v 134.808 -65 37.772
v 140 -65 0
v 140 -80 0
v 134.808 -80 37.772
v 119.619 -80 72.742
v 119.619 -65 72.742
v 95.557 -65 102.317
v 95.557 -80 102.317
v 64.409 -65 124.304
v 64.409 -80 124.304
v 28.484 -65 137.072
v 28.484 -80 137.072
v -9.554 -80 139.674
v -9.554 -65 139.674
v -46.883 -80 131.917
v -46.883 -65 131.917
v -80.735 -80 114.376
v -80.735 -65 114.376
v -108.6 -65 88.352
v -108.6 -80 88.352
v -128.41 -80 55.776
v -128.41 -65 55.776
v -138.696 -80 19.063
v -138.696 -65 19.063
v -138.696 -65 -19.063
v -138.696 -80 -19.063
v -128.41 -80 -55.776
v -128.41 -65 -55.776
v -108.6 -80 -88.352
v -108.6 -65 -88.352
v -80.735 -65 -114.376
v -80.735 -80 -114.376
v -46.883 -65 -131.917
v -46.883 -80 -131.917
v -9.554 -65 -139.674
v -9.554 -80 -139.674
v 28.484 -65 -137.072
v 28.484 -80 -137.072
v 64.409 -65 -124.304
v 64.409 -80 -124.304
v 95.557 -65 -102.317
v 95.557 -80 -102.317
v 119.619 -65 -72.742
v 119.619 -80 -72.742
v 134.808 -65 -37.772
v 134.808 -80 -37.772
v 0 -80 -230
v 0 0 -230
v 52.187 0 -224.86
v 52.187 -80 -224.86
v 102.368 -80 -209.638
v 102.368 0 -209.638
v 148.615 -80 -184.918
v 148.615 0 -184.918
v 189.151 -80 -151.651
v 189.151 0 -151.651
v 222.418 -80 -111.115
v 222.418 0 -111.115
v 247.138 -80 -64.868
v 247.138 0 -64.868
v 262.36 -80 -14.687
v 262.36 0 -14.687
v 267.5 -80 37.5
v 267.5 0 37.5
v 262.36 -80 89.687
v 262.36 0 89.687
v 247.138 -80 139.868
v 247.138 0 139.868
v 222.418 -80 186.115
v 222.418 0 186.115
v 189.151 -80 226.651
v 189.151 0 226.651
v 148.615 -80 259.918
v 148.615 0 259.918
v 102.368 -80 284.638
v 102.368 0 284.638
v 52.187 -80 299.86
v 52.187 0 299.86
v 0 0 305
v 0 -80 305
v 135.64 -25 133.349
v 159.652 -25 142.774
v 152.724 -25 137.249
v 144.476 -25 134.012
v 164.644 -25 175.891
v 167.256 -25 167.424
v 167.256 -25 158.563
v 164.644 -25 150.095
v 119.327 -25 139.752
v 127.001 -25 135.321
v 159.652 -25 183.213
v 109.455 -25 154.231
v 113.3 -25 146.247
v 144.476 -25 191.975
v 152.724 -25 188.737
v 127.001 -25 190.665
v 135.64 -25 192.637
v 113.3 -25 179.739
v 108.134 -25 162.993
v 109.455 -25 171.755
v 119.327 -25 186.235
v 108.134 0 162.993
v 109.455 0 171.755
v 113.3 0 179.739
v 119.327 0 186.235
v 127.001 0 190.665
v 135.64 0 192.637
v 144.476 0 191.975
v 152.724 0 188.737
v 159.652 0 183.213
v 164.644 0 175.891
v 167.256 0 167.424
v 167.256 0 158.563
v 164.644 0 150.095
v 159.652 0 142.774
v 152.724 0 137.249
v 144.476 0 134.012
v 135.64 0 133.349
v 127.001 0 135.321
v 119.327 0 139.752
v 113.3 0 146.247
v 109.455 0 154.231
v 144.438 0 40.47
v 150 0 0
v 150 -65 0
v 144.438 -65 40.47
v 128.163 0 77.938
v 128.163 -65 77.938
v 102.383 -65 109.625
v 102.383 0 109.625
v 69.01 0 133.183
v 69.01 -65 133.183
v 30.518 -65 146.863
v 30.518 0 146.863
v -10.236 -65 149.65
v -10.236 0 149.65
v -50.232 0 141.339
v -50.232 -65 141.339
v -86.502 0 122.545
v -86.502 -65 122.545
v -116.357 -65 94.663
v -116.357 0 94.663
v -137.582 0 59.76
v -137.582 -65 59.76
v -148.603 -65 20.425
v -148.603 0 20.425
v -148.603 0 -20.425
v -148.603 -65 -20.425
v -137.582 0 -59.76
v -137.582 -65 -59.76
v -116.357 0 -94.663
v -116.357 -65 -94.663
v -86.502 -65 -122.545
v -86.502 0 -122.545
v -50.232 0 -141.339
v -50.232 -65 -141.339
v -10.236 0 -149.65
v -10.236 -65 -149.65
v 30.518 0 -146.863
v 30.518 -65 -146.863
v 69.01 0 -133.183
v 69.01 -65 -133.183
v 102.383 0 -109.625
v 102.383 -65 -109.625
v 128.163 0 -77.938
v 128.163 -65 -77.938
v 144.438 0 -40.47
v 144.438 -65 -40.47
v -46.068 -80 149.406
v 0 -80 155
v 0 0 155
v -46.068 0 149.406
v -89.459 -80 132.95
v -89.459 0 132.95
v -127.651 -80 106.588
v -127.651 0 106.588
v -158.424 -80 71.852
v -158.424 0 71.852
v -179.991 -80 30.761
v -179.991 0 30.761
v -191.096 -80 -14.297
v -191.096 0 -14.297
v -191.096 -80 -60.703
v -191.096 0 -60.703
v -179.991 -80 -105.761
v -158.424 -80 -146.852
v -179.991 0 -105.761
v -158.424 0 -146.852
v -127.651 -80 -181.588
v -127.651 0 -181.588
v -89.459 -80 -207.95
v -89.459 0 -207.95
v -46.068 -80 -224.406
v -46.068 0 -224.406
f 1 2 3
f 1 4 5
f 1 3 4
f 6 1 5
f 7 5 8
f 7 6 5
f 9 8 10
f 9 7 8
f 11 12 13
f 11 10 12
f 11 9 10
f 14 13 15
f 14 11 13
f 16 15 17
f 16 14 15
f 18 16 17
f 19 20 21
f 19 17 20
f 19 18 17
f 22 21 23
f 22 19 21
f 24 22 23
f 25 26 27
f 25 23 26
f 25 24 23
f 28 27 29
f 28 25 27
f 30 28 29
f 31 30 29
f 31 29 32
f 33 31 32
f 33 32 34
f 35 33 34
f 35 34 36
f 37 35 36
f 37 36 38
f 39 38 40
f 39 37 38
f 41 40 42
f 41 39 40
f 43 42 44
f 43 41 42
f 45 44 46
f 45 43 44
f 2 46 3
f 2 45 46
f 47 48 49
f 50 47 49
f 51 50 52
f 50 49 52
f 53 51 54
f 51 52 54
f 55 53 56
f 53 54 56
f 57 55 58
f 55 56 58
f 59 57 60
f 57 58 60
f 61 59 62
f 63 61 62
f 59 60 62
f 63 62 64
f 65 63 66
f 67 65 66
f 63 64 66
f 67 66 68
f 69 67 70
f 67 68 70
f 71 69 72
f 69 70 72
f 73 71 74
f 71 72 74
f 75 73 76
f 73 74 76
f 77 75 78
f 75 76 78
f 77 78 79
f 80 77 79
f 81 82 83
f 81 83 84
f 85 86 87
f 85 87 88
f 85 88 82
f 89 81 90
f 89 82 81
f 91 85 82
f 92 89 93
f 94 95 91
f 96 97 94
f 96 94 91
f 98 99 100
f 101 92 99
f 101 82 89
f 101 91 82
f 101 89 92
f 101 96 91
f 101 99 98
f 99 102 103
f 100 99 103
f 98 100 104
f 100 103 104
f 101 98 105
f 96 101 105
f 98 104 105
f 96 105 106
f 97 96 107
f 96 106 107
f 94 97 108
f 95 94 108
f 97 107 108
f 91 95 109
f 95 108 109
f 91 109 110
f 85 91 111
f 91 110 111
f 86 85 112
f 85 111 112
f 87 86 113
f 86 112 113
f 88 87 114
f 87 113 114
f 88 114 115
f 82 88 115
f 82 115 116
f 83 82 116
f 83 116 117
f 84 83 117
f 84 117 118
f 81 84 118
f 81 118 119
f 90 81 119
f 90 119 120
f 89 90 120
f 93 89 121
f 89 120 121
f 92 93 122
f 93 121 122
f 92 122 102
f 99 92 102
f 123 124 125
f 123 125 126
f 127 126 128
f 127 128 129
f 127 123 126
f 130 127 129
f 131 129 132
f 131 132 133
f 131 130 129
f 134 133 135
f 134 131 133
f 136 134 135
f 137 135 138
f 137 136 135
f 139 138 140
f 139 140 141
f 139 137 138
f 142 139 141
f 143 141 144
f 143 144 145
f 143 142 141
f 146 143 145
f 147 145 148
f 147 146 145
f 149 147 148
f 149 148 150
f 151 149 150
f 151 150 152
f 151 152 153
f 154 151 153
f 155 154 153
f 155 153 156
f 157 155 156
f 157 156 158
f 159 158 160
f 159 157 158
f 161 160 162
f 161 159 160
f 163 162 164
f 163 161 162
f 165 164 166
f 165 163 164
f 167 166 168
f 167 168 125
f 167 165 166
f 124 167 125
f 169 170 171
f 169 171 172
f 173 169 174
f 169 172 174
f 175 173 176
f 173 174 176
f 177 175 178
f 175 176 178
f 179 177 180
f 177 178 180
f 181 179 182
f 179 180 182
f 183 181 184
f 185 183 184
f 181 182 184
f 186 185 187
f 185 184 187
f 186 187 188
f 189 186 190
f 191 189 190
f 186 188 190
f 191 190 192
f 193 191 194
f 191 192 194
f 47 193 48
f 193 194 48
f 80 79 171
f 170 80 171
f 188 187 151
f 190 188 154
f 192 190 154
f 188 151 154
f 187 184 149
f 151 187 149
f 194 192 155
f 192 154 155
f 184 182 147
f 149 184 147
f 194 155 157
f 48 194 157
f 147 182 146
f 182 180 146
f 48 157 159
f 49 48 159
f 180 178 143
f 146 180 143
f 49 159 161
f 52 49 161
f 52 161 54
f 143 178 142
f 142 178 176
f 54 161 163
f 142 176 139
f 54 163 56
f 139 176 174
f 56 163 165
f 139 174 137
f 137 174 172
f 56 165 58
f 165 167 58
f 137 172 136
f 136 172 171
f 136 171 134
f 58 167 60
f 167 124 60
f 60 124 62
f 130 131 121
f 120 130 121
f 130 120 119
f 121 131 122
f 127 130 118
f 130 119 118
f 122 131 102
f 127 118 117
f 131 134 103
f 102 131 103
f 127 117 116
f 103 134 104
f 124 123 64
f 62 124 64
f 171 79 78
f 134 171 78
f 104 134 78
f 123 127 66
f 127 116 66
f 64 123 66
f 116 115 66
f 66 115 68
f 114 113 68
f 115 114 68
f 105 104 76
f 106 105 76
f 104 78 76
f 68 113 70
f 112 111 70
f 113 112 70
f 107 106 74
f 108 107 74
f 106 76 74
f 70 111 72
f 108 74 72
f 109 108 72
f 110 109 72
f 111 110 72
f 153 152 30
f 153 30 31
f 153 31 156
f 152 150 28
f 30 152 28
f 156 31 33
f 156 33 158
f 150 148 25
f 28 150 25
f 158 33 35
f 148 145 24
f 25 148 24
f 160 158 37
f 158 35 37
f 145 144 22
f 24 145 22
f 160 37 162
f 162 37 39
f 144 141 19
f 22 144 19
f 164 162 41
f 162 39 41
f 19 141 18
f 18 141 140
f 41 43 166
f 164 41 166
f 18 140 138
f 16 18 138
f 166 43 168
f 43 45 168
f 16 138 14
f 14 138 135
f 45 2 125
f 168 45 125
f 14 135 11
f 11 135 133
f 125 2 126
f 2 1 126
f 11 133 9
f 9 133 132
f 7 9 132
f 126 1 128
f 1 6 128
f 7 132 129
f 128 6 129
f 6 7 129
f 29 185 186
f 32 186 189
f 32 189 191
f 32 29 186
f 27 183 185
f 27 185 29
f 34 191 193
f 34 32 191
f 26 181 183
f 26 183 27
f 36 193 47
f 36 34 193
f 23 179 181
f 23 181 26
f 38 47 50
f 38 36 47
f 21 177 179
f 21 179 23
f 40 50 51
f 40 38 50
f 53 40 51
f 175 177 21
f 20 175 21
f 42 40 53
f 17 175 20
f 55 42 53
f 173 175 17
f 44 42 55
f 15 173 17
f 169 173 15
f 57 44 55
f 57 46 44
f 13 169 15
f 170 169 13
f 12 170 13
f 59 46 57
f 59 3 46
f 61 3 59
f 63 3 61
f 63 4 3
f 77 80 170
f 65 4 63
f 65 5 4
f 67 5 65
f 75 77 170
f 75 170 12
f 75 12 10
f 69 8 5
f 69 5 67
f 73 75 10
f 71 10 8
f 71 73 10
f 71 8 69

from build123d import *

# Parameters (mm, degrees)
F0_R     = 150
F1_DEPTH = 80
F2_R     = 150
F3_DEPTH = 65
F4_R     = 140
F5_DEPTH = 80.001
F6_R     = 29.726832
F7_DEPTH = 25


with BuildPart() as f1:
    # F0 (on Front) → F1 (new body)
    with BuildSketch(Plane.XZ):
        with BuildLine():
            Line((0, 305), (0, 155))
            ThreePointArc((0, 155), (-192.5, -37.5), (0, -230))
            ThreePointArc((0, -230), (267.5, 37.5), (0, 305))
        make_face()
        Circle(F0_R, mode=Mode.SUBTRACT)
        Circle(F0_R)
    extrude(amount=F1_DEPTH)

    # F2 (on Front) → F3 (cut)
    with BuildSketch(Plane.XZ):
        Circle(F2_R)
    extrude(amount=F3_DEPTH, mode=Mode.SUBTRACT)

    # F4 (on Front) → F5 (cut, through all)
    with BuildSketch(Plane.XZ):
        Circle(F4_R)
    extrude(amount=F5_DEPTH, mode=Mode.SUBTRACT)

    # F6 (on face) → F7 (cut)
    with BuildSketch(Plane(origin=(0, 0, 0), x_dir=(-1, 0, 0), z_dir=(0, 1, 0))):
        with Locations((-137.861013, 162.993148)):
            Circle(F6_R)
    extrude(amount=-F7_DEPTH, mode=Mode.SUBTRACT)


solid = f1.part
